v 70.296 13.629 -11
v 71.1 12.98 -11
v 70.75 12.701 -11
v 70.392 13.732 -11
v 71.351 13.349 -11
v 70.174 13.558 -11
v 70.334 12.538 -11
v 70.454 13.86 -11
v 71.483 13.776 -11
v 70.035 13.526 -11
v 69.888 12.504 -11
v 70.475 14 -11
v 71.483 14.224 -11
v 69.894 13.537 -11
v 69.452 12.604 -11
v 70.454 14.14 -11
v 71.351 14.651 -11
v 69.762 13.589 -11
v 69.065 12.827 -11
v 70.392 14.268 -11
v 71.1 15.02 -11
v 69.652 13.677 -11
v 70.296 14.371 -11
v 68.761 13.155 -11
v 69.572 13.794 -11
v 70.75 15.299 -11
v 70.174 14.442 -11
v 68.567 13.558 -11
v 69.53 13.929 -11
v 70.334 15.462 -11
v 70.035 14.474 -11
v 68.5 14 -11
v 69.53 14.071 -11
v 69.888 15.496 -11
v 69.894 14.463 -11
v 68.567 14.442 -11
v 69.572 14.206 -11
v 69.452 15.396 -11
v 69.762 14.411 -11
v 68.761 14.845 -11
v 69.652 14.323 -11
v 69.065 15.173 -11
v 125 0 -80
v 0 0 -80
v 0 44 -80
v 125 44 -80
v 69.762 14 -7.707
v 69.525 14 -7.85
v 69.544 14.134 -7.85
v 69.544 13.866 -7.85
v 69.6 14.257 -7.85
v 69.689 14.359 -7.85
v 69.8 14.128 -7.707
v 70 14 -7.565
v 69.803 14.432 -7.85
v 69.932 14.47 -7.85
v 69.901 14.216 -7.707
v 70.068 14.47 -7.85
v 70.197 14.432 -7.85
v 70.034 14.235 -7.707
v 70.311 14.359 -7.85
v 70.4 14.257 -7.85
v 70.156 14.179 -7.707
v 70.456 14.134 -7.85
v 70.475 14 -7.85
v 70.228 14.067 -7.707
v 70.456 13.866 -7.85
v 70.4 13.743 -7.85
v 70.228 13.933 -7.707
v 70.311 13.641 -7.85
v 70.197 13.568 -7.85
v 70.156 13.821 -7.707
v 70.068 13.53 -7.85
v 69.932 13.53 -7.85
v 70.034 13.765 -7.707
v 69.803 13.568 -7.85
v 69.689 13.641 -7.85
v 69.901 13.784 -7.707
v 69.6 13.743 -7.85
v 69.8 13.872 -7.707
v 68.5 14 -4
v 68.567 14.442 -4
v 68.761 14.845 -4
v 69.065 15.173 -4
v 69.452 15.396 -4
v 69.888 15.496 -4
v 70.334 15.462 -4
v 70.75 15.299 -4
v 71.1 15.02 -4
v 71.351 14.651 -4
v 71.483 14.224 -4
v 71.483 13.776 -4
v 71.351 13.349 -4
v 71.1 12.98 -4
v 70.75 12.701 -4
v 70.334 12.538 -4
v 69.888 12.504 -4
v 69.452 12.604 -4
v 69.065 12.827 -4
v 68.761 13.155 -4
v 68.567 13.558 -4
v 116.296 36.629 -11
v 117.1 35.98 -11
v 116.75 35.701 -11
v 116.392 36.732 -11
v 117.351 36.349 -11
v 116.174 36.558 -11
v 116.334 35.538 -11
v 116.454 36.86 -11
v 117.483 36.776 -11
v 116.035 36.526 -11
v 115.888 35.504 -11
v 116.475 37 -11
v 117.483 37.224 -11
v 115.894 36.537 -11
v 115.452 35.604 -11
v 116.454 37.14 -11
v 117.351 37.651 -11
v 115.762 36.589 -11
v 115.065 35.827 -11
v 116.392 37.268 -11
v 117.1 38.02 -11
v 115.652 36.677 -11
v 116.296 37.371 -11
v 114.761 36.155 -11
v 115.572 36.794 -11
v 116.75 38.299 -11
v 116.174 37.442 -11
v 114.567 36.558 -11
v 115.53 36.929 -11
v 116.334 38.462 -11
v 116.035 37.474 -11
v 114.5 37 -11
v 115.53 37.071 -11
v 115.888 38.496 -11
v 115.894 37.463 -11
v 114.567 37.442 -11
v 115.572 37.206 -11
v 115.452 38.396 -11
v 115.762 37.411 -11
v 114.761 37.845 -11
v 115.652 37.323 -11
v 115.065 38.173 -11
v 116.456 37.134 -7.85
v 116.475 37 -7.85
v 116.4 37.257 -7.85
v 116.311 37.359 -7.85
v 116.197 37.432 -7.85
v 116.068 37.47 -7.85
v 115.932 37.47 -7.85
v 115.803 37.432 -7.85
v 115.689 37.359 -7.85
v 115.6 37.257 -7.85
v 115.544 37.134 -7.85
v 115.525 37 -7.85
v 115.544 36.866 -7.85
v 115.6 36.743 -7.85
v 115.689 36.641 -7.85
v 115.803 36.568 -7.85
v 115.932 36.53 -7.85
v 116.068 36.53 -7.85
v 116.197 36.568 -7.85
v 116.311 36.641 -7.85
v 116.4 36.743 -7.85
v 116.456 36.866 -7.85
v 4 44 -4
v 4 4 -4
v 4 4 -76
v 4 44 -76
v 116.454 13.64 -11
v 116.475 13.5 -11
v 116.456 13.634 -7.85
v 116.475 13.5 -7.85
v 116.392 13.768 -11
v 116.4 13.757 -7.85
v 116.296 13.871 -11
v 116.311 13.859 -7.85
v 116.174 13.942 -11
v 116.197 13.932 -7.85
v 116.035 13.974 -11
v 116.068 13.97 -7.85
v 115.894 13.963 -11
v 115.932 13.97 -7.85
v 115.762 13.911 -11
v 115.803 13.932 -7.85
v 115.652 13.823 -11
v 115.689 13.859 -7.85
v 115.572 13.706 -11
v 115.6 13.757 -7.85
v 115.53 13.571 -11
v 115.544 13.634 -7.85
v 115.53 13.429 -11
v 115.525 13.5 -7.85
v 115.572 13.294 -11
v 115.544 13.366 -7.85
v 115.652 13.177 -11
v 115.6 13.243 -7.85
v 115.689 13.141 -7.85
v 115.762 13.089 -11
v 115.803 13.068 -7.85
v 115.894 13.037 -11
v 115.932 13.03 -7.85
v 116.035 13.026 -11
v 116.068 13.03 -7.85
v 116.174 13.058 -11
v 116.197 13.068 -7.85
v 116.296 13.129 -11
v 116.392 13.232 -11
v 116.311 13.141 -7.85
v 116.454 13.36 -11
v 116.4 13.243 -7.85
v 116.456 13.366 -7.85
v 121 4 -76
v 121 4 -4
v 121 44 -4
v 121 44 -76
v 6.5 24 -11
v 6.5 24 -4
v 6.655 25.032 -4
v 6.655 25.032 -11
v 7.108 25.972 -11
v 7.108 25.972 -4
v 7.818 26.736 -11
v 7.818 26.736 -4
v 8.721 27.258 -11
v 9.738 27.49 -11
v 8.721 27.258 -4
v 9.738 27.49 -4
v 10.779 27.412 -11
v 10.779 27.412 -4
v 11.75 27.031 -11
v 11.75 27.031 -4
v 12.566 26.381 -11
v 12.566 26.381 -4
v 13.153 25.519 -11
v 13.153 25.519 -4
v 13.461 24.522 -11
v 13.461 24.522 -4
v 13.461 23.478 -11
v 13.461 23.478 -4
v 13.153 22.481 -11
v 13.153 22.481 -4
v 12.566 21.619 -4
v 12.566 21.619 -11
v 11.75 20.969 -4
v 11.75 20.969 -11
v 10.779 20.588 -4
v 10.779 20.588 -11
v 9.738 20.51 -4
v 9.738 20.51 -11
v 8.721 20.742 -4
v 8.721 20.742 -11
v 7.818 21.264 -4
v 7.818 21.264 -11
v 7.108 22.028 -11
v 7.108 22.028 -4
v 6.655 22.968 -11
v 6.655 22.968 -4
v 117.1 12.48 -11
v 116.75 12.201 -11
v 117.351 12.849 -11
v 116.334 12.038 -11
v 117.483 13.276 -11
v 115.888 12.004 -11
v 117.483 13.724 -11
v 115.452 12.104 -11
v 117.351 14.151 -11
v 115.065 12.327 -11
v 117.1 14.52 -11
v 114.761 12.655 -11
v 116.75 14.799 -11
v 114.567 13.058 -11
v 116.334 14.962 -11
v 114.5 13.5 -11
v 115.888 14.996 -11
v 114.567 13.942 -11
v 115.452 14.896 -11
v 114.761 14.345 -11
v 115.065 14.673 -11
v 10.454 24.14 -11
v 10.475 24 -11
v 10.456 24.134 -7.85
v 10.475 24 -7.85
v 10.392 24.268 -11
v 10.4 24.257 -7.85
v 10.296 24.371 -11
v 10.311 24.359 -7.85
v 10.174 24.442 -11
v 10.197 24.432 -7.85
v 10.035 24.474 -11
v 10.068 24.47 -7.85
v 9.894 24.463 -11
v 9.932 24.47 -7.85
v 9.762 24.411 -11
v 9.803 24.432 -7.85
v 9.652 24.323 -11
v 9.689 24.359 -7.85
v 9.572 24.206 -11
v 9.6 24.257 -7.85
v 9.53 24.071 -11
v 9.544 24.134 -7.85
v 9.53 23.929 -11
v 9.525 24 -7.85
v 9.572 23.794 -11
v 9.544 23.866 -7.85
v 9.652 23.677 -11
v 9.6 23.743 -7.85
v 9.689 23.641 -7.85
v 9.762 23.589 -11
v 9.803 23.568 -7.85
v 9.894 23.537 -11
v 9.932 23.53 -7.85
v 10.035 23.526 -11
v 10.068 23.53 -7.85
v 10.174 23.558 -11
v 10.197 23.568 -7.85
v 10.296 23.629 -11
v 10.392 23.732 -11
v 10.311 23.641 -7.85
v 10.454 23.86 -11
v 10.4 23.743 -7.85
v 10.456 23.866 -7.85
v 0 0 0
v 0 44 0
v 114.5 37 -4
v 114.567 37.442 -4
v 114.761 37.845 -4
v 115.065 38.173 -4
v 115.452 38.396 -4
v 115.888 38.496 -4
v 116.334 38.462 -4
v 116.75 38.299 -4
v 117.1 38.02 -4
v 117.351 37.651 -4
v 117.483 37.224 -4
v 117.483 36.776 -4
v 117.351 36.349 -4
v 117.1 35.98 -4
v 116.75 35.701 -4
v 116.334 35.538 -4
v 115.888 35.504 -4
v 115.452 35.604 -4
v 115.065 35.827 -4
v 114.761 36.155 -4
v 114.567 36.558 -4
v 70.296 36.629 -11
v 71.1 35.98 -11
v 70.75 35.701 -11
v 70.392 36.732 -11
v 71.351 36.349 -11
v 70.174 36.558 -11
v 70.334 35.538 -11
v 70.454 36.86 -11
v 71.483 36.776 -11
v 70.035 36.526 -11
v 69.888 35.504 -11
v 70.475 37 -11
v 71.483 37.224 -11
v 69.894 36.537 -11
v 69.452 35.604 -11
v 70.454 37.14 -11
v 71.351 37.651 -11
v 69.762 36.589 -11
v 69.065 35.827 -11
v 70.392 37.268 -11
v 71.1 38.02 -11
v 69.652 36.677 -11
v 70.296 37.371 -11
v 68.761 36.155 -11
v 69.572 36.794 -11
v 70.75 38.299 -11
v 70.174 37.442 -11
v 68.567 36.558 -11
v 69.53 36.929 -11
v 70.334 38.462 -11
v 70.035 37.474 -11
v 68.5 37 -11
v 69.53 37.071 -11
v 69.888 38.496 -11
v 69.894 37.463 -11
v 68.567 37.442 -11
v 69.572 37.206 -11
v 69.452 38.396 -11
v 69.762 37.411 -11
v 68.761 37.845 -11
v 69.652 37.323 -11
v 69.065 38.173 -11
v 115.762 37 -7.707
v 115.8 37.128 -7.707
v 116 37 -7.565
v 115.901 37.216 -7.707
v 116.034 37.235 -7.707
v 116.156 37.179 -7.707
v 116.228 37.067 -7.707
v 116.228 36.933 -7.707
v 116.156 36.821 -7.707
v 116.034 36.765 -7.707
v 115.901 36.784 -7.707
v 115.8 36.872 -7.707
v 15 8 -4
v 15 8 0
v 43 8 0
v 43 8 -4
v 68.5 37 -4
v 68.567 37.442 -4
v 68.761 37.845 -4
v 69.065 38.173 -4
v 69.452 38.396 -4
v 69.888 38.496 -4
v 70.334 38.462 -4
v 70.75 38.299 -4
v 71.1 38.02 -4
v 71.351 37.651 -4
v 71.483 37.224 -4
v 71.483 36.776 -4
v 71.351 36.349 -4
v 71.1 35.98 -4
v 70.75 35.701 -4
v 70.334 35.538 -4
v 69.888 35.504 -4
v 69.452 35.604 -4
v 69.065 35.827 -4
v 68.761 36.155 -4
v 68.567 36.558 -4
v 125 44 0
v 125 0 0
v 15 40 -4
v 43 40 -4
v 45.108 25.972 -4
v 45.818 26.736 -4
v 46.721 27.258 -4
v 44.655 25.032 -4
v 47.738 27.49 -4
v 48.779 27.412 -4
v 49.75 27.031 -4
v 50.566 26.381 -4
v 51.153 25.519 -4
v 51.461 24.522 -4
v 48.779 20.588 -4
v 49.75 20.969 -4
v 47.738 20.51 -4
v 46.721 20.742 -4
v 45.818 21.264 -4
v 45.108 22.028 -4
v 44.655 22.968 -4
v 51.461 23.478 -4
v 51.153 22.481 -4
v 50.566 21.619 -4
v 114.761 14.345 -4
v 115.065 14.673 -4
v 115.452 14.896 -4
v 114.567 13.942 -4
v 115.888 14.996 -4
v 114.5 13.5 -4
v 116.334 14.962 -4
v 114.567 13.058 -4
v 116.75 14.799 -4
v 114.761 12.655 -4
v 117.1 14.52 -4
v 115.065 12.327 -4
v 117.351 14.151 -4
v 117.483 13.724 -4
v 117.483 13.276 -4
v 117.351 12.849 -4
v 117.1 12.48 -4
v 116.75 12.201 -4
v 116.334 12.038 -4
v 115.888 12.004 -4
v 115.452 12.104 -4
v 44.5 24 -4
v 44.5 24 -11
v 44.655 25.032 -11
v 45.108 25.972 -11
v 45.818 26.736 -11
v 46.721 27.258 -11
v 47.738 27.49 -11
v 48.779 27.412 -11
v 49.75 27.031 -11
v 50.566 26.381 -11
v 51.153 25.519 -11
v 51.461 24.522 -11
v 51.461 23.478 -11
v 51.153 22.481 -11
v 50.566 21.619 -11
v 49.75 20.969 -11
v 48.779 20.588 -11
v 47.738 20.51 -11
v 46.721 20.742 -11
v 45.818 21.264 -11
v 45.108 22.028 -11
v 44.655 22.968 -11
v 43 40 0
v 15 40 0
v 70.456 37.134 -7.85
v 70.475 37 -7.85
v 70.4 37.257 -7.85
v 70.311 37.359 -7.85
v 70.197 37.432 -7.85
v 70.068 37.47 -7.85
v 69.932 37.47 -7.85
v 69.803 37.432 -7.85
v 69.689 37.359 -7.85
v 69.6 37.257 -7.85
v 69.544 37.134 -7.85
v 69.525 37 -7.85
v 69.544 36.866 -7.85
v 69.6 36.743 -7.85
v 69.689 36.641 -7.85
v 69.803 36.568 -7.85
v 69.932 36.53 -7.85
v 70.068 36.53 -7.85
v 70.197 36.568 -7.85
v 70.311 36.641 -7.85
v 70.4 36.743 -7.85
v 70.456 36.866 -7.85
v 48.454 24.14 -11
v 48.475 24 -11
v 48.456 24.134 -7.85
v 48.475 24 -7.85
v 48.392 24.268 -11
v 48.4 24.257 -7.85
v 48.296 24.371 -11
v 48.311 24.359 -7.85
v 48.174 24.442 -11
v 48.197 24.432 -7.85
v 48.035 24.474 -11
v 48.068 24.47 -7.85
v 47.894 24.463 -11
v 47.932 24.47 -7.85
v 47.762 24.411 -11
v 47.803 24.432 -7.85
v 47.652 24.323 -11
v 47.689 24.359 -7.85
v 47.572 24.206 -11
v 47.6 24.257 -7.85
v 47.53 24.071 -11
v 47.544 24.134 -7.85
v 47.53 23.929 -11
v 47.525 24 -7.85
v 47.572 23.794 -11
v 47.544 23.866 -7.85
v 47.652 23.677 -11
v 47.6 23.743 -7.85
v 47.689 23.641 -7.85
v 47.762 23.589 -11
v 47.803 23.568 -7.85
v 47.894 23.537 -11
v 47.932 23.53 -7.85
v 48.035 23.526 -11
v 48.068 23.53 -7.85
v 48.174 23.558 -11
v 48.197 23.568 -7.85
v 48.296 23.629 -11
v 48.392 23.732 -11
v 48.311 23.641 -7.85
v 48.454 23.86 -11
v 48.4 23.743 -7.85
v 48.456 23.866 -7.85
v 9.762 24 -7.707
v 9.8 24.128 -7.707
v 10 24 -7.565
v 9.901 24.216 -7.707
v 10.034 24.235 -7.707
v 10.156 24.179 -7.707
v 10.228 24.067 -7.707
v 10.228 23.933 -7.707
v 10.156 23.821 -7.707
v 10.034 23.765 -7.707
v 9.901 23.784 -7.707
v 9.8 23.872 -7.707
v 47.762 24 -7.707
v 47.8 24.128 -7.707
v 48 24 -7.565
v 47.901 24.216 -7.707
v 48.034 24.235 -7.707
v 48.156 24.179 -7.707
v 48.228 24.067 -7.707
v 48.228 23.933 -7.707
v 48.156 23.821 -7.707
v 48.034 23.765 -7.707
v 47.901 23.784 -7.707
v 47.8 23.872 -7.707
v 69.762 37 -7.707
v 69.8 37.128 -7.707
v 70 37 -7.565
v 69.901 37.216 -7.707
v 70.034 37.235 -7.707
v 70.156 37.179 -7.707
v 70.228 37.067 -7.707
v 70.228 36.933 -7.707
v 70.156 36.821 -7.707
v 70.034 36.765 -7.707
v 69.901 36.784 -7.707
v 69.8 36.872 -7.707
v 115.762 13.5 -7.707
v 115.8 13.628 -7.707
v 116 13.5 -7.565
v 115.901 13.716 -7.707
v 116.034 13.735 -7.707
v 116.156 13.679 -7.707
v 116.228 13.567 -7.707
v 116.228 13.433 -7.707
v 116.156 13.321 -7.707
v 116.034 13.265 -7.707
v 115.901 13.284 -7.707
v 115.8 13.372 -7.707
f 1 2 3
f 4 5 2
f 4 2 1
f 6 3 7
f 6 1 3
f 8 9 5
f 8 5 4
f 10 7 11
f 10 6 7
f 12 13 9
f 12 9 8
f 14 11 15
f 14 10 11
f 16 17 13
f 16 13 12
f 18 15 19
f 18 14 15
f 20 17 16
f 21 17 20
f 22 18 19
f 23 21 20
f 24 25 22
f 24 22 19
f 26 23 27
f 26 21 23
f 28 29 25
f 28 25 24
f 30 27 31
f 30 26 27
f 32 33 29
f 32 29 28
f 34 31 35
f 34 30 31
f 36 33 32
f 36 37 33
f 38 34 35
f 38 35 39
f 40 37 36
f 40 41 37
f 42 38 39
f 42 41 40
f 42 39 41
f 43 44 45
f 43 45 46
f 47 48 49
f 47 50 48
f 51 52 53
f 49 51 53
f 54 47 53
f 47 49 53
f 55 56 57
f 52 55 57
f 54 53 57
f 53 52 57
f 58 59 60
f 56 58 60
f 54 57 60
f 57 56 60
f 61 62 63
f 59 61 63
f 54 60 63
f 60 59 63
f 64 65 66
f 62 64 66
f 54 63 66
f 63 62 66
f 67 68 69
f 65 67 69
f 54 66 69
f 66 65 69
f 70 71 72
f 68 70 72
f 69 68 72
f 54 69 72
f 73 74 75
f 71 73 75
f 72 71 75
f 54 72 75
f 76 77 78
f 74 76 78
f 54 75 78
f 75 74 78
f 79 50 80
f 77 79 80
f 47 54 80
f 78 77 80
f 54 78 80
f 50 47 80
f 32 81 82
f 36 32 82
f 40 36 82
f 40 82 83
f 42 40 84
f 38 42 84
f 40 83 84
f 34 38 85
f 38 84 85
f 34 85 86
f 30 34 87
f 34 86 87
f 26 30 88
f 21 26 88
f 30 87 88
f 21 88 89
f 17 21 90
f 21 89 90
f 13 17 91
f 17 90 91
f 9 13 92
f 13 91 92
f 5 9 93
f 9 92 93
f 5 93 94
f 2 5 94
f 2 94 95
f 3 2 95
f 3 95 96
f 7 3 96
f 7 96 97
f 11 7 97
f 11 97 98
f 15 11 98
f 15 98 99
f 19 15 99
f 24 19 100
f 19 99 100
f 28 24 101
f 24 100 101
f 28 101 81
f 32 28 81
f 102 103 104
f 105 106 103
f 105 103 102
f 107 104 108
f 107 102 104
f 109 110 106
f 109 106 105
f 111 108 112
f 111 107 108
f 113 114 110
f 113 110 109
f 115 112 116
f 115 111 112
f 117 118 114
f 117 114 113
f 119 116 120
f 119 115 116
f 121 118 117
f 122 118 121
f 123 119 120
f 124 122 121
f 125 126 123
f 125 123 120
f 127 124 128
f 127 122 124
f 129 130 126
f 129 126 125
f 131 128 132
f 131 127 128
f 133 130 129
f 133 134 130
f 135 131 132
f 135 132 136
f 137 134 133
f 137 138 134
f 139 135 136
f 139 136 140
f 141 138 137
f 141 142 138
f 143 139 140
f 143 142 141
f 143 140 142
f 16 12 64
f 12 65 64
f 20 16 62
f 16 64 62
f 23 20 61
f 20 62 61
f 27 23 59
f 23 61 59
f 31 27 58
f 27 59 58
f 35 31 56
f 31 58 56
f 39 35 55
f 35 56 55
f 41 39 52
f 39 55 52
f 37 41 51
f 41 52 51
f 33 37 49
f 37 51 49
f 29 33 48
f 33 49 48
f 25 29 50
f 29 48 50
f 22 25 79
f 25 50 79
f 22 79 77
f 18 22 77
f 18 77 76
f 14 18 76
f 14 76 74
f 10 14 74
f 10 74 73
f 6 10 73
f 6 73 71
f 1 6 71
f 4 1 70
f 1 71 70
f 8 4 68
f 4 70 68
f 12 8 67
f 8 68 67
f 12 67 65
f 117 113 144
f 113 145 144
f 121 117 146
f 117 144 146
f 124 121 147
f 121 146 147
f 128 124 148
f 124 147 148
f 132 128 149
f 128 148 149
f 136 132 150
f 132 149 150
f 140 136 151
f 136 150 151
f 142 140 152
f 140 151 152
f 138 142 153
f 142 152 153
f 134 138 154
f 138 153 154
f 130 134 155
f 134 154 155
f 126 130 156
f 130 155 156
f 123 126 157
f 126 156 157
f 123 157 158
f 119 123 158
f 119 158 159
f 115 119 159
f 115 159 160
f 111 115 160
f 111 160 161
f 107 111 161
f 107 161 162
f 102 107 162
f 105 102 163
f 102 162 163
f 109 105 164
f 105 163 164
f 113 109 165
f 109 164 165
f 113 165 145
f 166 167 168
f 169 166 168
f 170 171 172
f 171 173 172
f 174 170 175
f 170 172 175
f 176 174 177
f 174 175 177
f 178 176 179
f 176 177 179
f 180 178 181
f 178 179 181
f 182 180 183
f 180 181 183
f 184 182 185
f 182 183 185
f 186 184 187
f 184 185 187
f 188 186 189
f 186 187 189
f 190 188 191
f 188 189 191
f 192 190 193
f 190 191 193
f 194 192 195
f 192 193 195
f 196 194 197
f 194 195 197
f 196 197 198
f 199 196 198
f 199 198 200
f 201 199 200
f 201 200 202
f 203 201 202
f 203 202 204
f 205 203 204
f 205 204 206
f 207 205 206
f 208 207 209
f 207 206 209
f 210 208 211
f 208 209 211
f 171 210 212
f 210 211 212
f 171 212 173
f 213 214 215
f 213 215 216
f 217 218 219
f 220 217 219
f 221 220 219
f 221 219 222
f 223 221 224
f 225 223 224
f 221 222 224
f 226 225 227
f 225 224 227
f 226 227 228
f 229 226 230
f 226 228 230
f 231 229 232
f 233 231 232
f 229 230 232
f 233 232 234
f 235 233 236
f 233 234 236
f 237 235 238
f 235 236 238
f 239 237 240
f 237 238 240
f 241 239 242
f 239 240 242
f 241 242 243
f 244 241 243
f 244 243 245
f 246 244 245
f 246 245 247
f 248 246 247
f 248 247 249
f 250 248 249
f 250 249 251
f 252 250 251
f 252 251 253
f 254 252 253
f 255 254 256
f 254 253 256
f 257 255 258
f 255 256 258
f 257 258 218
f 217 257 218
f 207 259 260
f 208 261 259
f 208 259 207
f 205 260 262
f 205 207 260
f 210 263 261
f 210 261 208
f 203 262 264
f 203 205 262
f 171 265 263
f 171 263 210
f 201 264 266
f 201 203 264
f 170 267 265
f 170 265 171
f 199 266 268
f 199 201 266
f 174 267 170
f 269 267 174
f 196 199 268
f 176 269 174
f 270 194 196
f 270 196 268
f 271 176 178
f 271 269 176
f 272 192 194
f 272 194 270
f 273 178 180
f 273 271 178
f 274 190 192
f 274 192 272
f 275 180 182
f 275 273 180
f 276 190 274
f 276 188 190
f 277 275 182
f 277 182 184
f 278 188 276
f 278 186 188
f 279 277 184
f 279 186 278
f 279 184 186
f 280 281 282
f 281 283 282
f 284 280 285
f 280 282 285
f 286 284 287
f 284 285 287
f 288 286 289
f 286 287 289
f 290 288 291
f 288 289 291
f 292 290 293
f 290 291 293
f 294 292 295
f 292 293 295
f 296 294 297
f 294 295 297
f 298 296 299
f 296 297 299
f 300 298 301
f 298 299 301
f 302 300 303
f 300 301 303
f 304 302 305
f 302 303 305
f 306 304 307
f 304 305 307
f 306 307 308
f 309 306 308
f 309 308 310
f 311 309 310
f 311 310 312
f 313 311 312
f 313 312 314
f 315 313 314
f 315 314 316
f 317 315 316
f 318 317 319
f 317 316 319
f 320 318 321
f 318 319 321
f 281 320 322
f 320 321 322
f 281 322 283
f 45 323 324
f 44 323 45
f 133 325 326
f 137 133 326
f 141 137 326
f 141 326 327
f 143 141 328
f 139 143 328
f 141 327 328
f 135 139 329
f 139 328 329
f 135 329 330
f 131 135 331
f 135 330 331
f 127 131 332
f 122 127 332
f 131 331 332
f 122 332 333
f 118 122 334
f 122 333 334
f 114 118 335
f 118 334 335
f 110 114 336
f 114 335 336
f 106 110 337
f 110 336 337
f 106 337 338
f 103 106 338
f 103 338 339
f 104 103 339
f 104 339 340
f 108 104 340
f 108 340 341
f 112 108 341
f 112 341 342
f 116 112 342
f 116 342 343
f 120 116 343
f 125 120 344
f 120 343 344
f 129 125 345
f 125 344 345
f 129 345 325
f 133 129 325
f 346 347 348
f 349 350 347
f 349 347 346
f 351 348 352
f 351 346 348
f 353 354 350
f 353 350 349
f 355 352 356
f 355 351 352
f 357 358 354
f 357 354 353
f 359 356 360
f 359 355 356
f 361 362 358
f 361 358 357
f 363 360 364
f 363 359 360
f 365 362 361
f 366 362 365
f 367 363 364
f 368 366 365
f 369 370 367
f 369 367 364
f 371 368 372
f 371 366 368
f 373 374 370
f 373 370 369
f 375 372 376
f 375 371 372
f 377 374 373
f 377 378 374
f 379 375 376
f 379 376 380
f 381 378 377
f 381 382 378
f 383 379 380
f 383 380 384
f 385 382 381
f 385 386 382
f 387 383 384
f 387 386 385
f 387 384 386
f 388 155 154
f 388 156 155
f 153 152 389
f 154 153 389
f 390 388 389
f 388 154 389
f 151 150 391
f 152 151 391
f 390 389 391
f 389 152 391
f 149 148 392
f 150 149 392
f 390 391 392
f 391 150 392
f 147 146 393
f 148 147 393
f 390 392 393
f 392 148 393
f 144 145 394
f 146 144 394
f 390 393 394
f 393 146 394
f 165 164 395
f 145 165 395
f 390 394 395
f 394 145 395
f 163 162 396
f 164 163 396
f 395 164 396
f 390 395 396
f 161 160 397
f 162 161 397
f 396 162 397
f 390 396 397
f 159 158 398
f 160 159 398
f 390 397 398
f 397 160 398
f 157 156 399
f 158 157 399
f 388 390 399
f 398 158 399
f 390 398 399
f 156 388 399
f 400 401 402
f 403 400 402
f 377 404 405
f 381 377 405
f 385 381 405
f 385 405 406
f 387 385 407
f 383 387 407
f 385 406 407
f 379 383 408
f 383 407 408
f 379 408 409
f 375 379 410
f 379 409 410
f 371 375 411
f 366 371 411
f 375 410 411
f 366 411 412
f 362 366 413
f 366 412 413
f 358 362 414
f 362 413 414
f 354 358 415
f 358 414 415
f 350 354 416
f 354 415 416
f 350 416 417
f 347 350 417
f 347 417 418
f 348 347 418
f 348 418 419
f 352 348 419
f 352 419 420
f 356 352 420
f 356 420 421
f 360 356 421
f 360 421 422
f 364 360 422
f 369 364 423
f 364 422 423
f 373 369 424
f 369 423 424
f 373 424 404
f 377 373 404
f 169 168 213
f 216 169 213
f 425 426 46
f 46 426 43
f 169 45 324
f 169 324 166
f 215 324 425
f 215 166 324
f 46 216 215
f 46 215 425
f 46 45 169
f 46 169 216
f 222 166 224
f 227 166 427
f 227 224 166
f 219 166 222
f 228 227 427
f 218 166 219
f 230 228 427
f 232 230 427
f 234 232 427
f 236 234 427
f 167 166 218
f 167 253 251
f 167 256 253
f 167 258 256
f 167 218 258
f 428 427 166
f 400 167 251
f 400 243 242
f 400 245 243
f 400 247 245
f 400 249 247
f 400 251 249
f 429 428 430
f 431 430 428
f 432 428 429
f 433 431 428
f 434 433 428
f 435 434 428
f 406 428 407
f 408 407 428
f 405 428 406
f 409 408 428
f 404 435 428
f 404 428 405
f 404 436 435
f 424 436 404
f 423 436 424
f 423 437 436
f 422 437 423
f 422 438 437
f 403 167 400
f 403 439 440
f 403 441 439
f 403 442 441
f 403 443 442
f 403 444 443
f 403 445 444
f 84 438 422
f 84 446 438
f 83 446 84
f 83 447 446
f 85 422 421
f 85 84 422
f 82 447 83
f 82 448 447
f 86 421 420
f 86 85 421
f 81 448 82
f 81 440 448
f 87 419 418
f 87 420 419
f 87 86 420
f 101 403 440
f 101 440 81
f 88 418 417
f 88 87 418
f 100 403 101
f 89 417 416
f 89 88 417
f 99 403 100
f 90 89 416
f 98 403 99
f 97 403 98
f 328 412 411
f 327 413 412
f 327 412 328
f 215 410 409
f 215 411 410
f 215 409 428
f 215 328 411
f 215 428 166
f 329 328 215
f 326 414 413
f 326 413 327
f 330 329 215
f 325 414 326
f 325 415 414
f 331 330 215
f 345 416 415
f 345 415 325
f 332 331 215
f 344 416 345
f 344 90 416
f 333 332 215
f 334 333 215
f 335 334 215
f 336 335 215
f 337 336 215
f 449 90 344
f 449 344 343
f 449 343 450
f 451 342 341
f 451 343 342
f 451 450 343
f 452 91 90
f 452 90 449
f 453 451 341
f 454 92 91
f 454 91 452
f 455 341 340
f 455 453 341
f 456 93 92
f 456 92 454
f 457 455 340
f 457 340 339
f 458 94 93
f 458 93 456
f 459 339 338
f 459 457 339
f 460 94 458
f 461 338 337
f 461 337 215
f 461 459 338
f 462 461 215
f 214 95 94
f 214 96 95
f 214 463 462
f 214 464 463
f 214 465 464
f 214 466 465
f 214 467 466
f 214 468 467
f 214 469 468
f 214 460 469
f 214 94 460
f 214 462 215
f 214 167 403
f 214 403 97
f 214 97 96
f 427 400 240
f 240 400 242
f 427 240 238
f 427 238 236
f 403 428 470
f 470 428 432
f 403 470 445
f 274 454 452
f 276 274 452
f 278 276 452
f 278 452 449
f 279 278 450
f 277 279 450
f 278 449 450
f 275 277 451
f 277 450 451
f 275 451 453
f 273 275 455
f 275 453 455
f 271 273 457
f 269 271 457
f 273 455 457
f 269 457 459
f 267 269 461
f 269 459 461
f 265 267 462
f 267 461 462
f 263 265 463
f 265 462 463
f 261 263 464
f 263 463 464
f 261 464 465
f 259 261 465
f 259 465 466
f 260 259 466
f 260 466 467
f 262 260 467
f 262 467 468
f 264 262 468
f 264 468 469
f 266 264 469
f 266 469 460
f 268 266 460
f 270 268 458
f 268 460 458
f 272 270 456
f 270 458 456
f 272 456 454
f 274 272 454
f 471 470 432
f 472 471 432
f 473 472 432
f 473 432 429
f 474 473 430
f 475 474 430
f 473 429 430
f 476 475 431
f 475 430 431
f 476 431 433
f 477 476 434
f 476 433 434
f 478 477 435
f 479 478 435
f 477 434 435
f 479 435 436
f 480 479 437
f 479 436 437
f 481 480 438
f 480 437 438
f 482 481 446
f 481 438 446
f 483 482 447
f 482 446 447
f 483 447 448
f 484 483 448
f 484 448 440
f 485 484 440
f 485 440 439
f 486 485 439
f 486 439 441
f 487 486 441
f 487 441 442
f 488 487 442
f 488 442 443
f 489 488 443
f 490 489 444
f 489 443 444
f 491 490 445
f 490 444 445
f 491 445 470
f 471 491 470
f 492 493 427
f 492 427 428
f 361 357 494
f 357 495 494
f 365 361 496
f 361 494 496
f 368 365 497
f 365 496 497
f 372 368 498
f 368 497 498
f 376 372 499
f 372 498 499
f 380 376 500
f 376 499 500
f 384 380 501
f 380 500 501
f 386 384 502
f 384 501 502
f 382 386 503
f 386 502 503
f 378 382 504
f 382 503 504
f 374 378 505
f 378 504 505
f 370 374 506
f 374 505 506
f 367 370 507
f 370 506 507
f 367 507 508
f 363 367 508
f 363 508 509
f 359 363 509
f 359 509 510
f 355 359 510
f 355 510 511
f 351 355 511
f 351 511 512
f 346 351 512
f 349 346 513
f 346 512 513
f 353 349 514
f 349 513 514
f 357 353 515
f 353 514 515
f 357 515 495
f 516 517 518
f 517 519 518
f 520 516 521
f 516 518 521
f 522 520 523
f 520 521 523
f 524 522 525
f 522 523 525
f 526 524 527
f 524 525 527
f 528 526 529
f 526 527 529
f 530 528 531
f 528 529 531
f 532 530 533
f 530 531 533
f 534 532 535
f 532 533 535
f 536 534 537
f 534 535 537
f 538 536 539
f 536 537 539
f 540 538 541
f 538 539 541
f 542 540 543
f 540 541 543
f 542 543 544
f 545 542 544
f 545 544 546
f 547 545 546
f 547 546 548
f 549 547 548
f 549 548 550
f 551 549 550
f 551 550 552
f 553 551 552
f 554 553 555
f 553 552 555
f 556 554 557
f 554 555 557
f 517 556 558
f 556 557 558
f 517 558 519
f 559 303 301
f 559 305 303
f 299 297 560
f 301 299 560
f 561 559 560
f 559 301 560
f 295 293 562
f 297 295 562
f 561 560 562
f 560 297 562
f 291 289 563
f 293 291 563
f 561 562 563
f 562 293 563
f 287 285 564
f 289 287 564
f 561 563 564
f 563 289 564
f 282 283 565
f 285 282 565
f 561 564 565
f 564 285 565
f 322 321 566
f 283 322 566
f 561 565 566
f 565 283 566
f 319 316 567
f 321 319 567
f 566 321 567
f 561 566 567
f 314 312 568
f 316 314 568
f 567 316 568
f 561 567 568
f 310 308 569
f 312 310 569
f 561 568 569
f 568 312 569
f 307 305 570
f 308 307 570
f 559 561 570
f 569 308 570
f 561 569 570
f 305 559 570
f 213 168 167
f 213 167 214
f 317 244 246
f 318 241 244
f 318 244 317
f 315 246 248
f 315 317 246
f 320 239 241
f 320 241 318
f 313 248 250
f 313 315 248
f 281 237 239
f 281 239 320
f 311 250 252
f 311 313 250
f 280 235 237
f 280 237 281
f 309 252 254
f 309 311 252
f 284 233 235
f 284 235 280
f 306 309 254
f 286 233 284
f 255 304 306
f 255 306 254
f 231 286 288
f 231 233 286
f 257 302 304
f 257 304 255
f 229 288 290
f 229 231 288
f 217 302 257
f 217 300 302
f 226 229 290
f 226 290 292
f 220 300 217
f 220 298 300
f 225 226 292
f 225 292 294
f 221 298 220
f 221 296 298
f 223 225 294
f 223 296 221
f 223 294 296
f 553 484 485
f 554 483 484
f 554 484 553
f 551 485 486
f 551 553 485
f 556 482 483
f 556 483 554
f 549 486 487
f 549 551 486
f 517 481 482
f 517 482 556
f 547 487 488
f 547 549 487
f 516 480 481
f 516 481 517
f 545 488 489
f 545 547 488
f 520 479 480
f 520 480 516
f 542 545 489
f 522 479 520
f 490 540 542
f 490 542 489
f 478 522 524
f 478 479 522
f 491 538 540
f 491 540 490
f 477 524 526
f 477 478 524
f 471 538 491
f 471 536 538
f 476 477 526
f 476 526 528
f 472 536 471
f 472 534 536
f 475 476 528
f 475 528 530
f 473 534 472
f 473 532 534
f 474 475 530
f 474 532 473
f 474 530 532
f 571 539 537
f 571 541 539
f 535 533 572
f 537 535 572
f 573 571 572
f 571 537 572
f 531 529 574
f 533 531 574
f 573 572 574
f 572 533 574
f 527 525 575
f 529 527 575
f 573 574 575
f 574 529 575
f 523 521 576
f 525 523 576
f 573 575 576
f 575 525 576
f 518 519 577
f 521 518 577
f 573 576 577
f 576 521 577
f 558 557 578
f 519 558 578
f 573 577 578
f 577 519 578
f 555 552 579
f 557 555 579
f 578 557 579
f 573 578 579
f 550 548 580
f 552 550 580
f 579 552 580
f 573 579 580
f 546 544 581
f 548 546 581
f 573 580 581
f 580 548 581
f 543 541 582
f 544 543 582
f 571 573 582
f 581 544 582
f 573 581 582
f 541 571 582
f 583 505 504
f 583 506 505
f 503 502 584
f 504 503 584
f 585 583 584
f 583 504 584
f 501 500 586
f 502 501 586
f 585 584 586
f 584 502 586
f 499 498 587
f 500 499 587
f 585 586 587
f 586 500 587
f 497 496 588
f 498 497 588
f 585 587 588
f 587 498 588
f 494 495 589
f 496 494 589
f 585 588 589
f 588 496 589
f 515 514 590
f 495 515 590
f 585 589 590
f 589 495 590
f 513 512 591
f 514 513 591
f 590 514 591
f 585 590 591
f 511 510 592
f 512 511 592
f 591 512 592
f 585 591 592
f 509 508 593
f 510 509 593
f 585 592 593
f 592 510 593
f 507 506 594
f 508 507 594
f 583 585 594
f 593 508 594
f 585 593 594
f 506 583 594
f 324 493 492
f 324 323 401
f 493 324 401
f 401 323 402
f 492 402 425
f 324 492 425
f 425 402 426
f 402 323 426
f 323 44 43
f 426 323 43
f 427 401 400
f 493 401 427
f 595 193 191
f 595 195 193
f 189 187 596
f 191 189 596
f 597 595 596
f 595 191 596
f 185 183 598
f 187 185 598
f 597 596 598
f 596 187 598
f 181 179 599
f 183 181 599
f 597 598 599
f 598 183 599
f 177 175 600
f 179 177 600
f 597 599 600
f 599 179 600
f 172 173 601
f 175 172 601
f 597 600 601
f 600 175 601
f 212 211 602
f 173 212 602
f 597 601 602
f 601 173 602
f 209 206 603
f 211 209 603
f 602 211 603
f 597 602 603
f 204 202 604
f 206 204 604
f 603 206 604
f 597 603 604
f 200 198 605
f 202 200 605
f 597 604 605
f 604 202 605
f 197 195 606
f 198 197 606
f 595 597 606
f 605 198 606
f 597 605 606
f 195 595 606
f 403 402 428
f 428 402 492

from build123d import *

# Parameters (mm, degrees)
BASE_SKETCH_W                   = 125
BASE_SKETCH_H                   = 80
BASE_EXTRUDE_DEPTH              = 4
WALL_BASE_SKETCH_W              = 125
WALL_BASE_SKETCH_H              = 80
WALL_BASE_SKETCH_W_2            = 117
WALL_BASE_SKETCH_H_2            = 72
WALL_BASE_EXTRUDE_DEPTH         = 40
SPEAKER_HOLE_SKETCH_W           = 28
SPEAKER_HOLE_SKETCH_H           = 32
SPEAKER_HOLE_DEPTH              = 7
SPEAKER_STANDOFFS_SKETCH_R      = 3.5
SPEAKER_STANDOFFS_SKETCH_R_2    = 1.5
SPEAKER_STANDOFFS_EXTRUDE_DEPTH = 7
M1_2X0_25_TAPPED_HOLE2_D        = 0.95
M1_2X0_25_TAPPED_HOLE2_DEPTH    = 3.15
M1_2X0_25_TAPPED_HOLE2_TIP      = 0.285408794


with BuildPart() as part:
    # base sketch → base extrude (new body)
    with BuildSketch(Plane(origin=(0, 0, 0), x_dir=(1, 0, 0), z_dir=(0, 1, 0))):
        with Locations((62.5, 40)):
            Rectangle(BASE_SKETCH_W, BASE_SKETCH_H)
    extrude(amount=BASE_EXTRUDE_DEPTH)

    # wall base sketch → wall base extrude (add)
    with BuildSketch(Plane(origin=(0, 4, 0), x_dir=(1, 0, 0), z_dir=(0, 1, 0))):
        with Locations((62.5, 40)):
            Rectangle(WALL_BASE_SKETCH_W, WALL_BASE_SKETCH_H)
        with Locations((62.5, 40)):
            Rectangle(WALL_BASE_SKETCH_W_2, WALL_BASE_SKETCH_H_2, mode=Mode.SUBTRACT)
    extrude(amount=WALL_BASE_EXTRUDE_DEPTH)

    # speaker hole sketch → speaker hole (cut)
    with BuildSketch(Plane.XY):
        with Locations((29, 24)):
            Rectangle(SPEAKER_HOLE_SKETCH_W, SPEAKER_HOLE_SKETCH_H)
    extrude(amount=-SPEAKER_HOLE_DEPTH, mode=Mode.SUBTRACT)

    # speaker standoffs sketch → speaker standoffs extrude (add)
    with BuildSketch(Plane(origin=(0, 0, -4), x_dir=(-1, 0, 0), z_dir=(0, 0, -1))):
        with Locations((-48, 24)):
            Circle(SPEAKER_STANDOFFS_SKETCH_R)
        with Locations((-10, 24)):
            Circle(SPEAKER_STANDOFFS_SKETCH_R)
        with Locations((-116, 37)):
            Circle(SPEAKER_STANDOFFS_SKETCH_R_2)
        with Locations((-70, 37)):
            Circle(SPEAKER_STANDOFFS_SKETCH_R_2)
        with Locations((-116, 13.5)):
            Circle(SPEAKER_STANDOFFS_SKETCH_R_2)
        with Locations((-70, 14)):
            Circle(SPEAKER_STANDOFFS_SKETCH_R_2)
    extrude(amount=SPEAKER_STANDOFFS_EXTRUDE_DEPTH)

    # M1.2x0.25 Tapped Hole2
    with Locations(Plane(origin=(48, 24, -11), x_dir=(-1, 0, 0), z_dir=(0, 0, -1))):
        with Locations((0, 0), (38, 0), (-22, -10), (-22, 13), (-68, -10.5), (-68, 13)):
            Hole(M1_2X0_25_TAPPED_HOLE2_D / 2, depth=M1_2X0_25_TAPPED_HOLE2_DEPTH)
            with Locations((0, 0, -(M1_2X0_25_TAPPED_HOLE2_DEPTH + M1_2X0_25_TAPPED_HOLE2_TIP / 2))):  # 118° drill point
                Cone(0, M1_2X0_25_TAPPED_HOLE2_D / 2, M1_2X0_25_TAPPED_HOLE2_TIP, mode=Mode.SUBTRACT)


solid = part.part
